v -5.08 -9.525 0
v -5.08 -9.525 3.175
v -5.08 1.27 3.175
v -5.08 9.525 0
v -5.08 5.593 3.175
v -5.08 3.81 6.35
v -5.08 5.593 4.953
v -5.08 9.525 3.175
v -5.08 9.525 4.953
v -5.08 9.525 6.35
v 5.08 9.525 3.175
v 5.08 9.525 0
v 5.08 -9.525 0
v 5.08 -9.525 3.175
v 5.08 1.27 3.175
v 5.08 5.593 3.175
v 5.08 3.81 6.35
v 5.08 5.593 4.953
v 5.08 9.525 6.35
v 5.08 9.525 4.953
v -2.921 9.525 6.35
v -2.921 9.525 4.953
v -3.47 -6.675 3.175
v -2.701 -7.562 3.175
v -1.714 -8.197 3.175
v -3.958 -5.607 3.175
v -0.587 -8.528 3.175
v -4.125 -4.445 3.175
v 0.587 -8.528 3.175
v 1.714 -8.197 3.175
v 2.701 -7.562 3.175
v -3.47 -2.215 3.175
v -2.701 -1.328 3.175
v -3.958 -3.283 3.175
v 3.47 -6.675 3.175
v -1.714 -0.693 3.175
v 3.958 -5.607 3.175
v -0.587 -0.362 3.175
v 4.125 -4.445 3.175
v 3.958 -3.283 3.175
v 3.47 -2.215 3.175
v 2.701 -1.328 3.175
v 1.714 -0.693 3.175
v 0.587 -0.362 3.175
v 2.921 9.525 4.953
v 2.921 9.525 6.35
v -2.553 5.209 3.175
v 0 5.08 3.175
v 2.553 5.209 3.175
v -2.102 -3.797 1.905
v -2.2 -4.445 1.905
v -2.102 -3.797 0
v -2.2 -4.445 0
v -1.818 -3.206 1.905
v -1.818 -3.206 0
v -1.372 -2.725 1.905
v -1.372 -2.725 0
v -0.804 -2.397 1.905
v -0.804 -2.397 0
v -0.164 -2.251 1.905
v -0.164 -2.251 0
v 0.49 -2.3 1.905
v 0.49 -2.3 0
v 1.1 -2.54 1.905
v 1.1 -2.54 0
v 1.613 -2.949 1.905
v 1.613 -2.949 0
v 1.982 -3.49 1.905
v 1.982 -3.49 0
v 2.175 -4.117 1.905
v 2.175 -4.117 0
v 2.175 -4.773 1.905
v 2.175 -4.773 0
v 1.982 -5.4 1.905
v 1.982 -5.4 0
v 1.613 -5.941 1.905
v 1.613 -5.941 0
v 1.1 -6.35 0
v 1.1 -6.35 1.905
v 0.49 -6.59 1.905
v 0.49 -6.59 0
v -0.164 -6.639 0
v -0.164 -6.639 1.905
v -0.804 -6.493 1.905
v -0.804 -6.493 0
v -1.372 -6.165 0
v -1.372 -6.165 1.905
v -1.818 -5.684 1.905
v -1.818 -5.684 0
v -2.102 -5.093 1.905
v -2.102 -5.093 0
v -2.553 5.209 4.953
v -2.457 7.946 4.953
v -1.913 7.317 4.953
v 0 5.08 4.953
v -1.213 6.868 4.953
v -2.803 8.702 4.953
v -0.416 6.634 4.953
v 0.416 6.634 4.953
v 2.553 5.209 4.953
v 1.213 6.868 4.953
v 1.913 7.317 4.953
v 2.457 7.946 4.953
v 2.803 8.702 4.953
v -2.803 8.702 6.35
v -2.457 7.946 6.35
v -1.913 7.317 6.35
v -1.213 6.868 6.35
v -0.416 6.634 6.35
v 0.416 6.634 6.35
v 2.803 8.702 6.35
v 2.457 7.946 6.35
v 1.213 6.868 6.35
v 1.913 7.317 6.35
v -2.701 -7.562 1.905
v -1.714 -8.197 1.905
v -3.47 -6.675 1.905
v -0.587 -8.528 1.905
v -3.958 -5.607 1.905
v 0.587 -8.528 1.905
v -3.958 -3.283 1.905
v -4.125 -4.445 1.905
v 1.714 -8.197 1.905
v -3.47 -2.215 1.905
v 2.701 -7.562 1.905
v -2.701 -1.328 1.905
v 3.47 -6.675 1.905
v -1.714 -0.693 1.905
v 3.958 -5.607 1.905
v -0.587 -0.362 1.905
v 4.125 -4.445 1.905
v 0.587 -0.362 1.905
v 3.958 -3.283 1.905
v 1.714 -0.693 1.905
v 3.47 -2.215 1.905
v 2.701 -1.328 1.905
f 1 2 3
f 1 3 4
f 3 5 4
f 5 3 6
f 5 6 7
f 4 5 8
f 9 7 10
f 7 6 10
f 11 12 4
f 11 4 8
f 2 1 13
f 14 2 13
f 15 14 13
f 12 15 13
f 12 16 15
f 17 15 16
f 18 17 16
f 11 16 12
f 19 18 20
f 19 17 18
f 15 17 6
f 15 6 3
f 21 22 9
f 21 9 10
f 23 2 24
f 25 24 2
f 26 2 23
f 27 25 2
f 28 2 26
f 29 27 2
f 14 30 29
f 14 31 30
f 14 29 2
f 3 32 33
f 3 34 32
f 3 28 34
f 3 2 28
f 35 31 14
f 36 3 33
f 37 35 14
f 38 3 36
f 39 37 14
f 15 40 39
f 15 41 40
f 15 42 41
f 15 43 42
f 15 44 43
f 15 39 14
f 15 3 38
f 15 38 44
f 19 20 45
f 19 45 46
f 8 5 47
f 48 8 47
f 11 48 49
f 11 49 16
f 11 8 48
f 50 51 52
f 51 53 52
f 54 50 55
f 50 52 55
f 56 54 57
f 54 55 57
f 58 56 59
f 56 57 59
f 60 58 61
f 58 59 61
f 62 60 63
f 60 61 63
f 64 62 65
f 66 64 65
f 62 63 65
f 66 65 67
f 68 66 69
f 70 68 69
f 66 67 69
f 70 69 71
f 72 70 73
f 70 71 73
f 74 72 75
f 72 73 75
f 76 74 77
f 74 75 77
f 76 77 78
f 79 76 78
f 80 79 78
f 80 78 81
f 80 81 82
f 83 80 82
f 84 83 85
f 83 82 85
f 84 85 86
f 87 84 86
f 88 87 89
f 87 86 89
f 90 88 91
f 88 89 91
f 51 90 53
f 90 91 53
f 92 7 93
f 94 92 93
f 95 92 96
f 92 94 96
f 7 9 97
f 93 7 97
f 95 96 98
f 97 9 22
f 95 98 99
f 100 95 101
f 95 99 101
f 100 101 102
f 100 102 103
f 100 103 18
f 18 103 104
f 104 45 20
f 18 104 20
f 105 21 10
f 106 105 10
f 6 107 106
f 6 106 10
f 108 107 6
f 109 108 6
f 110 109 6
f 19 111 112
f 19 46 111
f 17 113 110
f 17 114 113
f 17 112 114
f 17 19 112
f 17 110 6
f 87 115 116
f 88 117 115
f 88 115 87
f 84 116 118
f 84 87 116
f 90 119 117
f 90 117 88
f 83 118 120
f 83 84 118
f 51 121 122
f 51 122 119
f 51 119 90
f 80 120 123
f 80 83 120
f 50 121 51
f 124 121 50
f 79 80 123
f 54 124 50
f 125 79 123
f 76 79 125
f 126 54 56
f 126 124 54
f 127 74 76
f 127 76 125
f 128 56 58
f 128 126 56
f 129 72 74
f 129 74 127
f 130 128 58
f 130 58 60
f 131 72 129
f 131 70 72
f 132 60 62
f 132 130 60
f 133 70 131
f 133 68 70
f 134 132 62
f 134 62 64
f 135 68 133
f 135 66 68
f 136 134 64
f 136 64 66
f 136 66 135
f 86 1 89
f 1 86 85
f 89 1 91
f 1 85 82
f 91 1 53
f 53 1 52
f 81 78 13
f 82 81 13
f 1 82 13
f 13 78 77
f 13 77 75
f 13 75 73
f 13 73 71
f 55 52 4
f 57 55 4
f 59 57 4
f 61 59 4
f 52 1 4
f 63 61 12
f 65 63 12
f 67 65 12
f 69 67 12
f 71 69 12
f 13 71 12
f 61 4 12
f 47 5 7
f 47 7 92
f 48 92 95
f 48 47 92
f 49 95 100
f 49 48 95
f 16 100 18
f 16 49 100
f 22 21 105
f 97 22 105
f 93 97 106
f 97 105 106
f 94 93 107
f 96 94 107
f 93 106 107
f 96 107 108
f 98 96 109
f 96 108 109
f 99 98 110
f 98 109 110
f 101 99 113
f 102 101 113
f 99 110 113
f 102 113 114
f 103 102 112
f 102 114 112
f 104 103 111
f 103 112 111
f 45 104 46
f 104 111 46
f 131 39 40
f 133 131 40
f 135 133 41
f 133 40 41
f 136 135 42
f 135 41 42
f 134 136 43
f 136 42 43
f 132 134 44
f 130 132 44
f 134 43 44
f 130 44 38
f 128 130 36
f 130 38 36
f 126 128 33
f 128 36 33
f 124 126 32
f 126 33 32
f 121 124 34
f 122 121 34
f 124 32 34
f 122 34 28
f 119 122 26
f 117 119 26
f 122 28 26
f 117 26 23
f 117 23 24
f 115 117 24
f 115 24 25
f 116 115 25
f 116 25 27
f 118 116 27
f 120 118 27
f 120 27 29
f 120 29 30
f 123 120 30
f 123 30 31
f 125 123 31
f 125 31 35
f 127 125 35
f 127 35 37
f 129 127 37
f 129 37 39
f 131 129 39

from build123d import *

# Parameters (mm, degrees)
F0_W           = 10.16
F0_H           = 19.05
F1_DEPTH       = 3.175
F4_DEPTH       = 10.16
F6_D           = 4.4
F6_DEPTH       = 12.7
F6_CBORE_D     = 8.25
F6_CBORE_DEPTH = 1.27
F7_R           = 25.4
F8_DEPTH       = 1.778
F9_R           = 2.921
F10_DEPTH      = 2.54


with BuildPart() as f1:
    # F0 (on Top) → F1 (new body)
    with BuildSketch(Plane.XY):
        Rectangle(F0_W, F0_H)
    extrude(amount=F1_DEPTH)

    # F2 (on face) → F4 (join, through all)
    with BuildSketch(Plane.YZ.offset(5.08)):
        Polygon((3.81, 6.35), (1.27, 3.175), (9.525, 3.175), (9.525, 6.35), align=None)
    extrude(amount=-F4_DEPTH)

    # F6
    with Locations(Plane.XY.offset(3.175)):
        with Locations((0, -4.445)):
            CounterBoreHole(F6_D / 2, F6_CBORE_D / 2, F6_CBORE_DEPTH, depth=F6_DEPTH)

    # F7 (on face) → F8 (cut)
    with BuildSketch(Plane.XY.offset(3.175)):
        with Locations((0, 30.48)):
            Circle(F7_R)
    extrude(amount=F8_DEPTH, mode=Mode.SUBTRACT)

    # F9 (on face) → F10 (cut)
    with BuildSketch(Plane.XY.offset(6.35)):
        with Locations((0, 9.525)):
            Circle(F9_R)
    extrude(amount=-F10_DEPTH, mode=Mode.SUBTRACT)


solid = f1.part
